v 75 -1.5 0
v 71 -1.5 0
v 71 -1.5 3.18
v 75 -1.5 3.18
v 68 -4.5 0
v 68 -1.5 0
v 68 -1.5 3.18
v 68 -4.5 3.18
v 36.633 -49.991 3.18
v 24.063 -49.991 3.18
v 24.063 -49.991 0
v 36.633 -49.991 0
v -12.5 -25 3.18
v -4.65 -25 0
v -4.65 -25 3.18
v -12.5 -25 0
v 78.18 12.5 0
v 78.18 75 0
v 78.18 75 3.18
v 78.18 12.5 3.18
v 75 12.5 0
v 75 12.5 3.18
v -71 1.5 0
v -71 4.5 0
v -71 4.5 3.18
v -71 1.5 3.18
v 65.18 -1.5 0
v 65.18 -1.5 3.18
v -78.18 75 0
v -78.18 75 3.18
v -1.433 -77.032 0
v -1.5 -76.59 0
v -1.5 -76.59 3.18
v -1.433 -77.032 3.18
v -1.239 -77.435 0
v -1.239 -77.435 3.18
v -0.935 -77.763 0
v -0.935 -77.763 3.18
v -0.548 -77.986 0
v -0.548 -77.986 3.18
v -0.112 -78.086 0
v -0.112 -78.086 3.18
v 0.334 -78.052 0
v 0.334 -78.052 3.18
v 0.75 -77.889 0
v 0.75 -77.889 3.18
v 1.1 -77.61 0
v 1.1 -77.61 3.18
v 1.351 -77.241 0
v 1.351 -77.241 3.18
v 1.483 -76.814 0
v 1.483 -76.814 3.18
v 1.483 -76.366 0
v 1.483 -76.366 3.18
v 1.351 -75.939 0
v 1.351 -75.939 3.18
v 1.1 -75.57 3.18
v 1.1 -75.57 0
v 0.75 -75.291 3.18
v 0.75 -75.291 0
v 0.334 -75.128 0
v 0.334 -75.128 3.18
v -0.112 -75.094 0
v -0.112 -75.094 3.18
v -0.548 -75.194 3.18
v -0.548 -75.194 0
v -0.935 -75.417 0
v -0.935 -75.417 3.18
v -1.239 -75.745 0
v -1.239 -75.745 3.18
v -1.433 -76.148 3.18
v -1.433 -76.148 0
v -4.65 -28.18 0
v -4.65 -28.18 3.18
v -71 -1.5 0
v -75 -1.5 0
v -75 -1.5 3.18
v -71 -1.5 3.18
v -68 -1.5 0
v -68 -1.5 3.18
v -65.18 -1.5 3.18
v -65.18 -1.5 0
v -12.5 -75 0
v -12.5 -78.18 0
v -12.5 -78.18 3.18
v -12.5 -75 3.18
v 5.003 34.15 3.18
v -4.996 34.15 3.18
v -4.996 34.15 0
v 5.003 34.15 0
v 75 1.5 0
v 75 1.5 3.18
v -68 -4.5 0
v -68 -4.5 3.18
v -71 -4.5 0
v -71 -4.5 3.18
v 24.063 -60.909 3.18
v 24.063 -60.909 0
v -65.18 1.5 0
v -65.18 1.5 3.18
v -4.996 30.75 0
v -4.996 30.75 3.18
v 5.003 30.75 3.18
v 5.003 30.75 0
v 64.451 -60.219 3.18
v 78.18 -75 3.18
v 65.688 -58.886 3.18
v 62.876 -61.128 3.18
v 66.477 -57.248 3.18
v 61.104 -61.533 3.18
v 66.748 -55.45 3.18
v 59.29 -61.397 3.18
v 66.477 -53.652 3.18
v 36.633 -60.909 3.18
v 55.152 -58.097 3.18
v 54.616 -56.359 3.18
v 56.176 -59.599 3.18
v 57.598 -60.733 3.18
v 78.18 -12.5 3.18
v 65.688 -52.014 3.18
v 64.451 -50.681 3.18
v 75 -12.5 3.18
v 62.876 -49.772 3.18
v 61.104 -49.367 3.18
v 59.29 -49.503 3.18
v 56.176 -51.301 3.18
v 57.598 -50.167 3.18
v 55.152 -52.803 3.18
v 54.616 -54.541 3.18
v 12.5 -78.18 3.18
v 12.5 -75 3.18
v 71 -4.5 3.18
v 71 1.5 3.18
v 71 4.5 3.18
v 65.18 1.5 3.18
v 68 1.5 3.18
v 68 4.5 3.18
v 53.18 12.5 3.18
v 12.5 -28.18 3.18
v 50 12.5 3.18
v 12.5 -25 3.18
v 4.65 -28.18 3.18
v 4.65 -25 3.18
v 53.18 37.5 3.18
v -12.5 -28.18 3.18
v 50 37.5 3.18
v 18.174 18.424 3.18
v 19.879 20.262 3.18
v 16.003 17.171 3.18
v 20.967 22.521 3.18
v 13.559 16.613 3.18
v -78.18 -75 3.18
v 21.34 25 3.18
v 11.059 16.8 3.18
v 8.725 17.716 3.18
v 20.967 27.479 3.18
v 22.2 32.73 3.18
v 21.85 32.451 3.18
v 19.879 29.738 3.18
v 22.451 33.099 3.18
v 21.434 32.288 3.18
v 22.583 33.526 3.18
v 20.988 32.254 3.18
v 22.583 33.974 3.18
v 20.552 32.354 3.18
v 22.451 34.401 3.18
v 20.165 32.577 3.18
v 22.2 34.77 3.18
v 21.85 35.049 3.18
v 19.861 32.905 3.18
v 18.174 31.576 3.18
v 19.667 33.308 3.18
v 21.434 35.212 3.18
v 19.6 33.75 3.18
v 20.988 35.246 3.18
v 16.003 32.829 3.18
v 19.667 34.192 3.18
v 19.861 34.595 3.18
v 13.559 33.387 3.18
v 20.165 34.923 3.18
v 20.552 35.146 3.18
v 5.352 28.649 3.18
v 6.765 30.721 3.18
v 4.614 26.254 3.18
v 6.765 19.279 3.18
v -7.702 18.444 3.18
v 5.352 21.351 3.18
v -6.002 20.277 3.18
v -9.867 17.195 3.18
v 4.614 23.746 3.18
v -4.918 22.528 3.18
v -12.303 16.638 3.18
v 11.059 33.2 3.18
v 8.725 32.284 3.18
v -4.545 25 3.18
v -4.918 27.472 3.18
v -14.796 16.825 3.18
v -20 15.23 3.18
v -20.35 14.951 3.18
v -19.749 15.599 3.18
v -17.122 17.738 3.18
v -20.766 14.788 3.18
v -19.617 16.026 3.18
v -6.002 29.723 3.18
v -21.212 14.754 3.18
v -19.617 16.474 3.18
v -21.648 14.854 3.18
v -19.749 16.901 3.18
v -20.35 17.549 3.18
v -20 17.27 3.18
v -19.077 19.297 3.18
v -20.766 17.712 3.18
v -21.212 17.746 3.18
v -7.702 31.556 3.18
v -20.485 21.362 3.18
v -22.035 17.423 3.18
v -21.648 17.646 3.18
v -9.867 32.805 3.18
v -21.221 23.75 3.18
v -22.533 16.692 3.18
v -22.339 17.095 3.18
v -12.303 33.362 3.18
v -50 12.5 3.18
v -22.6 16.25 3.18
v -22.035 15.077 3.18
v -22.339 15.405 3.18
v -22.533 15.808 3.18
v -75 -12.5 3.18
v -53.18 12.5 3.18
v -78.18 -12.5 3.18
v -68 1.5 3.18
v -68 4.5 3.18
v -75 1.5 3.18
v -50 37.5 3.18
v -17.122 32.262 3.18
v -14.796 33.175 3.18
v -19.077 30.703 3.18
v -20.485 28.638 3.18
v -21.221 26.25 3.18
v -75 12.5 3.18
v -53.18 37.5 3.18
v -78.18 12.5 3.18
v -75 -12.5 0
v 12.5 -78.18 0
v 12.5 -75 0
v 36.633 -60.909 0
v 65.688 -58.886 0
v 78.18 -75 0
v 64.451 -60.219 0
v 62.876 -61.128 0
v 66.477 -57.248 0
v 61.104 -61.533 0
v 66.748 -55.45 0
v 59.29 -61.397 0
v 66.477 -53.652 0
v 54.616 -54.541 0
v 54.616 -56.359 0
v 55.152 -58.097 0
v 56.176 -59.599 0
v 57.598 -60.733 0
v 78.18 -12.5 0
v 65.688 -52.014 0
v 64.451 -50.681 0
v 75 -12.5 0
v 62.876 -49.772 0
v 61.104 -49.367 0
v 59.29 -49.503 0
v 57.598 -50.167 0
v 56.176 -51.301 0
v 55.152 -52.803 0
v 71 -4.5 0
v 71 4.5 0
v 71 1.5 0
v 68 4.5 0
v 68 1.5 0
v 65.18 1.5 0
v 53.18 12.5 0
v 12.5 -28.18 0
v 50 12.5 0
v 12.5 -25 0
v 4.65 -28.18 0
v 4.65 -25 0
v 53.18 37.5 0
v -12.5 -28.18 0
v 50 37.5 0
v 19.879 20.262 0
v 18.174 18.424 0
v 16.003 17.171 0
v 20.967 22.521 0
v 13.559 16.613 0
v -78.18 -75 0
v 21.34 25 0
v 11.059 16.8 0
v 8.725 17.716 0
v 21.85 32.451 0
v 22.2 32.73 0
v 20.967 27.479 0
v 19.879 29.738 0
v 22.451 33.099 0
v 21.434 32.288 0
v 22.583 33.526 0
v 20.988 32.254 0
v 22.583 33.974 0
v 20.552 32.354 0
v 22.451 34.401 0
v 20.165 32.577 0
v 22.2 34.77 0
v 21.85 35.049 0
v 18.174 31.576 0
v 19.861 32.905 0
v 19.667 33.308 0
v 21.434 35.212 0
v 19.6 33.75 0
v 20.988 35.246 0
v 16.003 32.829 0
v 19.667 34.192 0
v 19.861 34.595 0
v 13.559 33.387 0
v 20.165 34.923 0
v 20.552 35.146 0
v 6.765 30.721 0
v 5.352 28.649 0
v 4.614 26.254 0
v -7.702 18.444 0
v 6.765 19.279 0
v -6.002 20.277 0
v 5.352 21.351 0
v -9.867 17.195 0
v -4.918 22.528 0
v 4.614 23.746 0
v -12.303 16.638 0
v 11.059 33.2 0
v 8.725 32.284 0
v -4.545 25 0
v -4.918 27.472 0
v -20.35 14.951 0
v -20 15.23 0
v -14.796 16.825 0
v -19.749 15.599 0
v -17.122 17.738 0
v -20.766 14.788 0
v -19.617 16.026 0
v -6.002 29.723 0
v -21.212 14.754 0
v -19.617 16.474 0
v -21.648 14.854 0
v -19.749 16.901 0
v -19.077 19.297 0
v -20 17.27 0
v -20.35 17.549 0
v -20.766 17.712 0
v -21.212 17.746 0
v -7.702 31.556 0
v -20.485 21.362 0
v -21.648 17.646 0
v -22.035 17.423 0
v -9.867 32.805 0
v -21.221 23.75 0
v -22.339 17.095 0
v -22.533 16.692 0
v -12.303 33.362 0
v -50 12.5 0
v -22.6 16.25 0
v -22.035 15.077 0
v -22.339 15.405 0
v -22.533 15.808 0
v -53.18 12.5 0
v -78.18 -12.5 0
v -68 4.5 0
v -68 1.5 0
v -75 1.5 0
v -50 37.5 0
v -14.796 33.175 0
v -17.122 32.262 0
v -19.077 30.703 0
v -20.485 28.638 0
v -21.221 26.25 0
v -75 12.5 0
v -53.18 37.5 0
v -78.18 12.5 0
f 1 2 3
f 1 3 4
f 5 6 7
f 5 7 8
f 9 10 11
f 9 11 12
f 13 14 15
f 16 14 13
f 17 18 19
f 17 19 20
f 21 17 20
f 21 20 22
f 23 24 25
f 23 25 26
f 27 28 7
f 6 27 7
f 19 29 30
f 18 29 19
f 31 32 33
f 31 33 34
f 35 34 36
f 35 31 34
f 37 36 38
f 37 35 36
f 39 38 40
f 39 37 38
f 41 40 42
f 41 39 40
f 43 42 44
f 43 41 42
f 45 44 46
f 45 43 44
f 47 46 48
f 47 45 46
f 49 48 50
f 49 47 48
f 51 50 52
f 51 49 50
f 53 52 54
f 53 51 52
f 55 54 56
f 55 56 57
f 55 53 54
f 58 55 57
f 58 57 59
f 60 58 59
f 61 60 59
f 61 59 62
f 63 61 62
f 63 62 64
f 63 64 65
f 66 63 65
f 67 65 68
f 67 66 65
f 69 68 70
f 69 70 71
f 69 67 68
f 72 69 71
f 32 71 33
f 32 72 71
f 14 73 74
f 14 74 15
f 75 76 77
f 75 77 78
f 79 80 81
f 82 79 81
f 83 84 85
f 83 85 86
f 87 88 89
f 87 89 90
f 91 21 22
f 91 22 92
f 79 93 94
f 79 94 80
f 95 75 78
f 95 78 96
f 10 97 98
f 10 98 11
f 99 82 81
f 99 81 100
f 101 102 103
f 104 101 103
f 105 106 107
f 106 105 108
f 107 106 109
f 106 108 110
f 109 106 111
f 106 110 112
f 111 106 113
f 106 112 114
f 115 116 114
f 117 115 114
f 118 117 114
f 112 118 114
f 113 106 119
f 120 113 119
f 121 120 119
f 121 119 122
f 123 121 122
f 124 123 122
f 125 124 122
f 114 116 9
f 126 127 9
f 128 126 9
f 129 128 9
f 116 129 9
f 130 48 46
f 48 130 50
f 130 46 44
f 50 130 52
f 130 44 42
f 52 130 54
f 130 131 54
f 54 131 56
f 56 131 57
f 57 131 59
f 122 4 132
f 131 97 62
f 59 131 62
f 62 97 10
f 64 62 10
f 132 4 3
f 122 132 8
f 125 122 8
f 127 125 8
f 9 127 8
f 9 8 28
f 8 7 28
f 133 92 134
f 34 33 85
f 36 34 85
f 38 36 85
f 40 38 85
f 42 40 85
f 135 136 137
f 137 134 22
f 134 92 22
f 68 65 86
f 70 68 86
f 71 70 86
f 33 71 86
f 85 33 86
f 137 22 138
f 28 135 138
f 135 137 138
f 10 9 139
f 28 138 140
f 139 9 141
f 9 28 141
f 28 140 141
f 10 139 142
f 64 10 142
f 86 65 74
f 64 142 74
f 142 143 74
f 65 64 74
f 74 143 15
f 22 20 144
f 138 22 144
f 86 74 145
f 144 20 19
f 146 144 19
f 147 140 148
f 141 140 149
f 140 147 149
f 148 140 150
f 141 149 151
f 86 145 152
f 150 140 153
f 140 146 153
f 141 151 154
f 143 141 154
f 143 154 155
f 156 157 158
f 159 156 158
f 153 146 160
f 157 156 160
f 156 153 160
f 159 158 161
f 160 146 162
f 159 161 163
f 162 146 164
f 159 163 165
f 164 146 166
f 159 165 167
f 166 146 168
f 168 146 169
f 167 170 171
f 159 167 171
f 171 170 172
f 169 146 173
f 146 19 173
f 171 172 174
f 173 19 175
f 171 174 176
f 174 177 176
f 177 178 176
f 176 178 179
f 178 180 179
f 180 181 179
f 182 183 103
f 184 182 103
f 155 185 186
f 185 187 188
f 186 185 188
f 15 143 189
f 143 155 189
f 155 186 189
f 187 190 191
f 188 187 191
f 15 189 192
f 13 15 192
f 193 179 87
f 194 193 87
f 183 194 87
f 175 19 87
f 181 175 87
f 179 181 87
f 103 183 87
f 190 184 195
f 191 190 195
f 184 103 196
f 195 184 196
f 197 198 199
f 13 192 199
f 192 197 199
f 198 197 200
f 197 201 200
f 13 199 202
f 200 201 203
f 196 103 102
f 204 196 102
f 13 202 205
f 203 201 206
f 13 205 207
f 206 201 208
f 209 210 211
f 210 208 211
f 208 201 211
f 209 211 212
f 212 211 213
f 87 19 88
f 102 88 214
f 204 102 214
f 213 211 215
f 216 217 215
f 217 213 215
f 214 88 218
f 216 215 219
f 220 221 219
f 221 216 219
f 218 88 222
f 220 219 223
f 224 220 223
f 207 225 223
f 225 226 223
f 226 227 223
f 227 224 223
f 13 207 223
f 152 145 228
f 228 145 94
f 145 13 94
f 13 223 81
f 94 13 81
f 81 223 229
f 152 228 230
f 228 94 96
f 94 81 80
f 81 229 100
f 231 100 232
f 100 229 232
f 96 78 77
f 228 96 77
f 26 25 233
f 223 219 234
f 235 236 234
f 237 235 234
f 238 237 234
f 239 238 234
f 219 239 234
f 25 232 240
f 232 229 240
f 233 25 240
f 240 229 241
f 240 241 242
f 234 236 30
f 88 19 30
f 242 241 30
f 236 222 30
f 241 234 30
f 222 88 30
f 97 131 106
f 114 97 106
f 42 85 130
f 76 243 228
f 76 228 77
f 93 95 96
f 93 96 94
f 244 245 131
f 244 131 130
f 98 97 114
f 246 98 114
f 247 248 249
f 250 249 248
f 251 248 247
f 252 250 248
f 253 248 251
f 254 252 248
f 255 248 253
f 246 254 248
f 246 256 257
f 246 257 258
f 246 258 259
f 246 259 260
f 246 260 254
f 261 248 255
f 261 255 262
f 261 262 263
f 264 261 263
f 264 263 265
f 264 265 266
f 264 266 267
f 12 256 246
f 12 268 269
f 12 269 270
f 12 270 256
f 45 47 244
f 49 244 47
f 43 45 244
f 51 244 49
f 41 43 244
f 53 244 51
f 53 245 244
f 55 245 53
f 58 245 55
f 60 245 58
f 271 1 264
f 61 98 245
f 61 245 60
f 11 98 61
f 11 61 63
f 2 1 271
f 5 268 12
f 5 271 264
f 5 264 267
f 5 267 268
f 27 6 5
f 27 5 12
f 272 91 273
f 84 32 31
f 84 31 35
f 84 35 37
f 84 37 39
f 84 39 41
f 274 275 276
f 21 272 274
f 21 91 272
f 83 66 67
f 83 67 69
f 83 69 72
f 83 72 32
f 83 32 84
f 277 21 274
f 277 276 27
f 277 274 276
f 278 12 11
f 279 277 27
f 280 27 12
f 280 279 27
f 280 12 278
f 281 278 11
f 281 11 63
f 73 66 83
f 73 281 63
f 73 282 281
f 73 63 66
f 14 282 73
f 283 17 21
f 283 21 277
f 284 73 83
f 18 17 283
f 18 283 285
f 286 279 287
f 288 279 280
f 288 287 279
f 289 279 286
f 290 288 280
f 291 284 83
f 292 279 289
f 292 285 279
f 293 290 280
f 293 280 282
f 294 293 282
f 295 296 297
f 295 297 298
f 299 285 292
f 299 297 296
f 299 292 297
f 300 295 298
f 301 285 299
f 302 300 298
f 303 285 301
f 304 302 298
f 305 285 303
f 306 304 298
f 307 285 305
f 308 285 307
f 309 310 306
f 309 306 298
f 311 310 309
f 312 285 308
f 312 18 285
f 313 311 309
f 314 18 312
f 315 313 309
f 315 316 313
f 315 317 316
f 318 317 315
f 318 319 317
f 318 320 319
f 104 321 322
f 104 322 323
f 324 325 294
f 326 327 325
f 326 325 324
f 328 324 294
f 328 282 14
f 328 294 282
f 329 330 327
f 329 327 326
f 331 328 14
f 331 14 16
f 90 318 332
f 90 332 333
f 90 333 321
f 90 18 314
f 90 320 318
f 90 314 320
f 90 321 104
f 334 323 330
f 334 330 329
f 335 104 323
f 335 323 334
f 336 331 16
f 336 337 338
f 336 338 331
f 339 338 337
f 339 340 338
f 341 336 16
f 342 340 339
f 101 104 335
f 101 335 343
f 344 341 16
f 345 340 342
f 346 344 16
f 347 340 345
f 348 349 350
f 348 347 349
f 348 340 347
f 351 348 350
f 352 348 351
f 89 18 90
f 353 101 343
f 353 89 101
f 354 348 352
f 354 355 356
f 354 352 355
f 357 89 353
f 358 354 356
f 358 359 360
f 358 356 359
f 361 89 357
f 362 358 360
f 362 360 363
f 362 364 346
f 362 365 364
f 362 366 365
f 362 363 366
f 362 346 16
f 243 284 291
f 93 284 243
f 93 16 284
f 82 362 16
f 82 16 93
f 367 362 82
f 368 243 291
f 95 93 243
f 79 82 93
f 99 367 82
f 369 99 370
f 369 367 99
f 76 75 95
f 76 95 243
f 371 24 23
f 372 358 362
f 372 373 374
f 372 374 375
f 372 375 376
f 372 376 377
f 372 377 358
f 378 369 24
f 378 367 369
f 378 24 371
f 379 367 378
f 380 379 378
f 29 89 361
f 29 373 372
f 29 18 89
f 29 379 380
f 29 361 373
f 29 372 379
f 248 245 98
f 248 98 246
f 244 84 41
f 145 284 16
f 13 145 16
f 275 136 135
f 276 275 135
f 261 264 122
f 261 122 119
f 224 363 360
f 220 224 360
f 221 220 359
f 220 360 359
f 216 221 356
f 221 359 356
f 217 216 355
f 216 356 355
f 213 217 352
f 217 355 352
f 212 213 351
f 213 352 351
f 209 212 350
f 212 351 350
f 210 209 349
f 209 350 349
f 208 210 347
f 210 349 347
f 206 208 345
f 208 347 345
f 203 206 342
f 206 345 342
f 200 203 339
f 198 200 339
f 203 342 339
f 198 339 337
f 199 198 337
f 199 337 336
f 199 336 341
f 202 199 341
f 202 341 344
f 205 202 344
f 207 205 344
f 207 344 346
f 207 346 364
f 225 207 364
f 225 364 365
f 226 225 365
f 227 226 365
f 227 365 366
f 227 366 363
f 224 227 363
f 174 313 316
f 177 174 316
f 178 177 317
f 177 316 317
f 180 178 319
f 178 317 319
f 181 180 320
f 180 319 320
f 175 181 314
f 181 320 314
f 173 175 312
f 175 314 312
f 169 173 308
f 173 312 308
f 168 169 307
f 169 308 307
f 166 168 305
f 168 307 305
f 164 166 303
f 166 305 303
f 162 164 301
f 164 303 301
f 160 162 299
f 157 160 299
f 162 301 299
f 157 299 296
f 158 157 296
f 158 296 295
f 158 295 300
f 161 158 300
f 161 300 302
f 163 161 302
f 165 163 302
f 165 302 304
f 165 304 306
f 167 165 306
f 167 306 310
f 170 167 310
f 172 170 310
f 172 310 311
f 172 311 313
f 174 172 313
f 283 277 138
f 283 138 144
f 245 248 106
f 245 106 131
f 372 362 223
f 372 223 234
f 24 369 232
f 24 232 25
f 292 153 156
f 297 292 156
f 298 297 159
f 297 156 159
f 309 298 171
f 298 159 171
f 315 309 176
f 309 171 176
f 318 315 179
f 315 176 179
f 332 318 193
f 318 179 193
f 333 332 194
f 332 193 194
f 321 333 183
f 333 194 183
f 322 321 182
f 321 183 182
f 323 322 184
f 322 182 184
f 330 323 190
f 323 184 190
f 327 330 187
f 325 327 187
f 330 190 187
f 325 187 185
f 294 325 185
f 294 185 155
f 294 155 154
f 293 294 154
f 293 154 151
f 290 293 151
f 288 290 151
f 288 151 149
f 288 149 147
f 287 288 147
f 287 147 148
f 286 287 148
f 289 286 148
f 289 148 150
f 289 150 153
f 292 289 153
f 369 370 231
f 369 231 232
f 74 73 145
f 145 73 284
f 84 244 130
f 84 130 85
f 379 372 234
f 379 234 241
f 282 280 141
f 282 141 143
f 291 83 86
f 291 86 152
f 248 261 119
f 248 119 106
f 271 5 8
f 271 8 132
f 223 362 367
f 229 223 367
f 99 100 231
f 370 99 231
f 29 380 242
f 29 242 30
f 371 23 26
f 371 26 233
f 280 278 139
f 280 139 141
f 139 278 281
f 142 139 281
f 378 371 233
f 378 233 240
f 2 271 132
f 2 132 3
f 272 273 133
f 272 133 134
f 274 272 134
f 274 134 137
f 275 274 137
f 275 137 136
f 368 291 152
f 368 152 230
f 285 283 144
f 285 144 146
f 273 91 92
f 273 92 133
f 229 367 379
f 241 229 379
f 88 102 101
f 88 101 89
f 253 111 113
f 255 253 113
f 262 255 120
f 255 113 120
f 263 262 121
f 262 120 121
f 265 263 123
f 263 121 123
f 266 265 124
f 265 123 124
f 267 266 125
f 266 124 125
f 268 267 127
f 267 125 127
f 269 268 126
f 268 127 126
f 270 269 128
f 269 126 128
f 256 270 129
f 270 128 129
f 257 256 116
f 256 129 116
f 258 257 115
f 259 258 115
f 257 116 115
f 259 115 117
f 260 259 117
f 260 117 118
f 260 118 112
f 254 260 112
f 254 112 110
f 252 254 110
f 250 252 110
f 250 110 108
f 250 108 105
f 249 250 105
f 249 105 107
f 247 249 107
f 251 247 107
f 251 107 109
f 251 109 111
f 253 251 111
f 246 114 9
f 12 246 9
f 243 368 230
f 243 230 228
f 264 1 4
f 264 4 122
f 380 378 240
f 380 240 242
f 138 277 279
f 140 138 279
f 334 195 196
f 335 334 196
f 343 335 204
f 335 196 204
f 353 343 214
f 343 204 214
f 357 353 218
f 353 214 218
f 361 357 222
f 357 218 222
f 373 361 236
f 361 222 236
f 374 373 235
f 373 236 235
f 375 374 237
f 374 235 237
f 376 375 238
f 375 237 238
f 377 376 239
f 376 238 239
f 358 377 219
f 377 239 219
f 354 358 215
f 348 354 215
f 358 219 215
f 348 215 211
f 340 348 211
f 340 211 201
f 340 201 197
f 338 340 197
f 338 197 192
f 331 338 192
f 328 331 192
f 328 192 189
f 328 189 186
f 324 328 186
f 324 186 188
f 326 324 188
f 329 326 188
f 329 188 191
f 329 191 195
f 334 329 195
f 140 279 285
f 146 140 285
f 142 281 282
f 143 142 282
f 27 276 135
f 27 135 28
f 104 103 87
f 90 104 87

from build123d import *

# Parameters (mm, degrees)
SKETCH1_R           = 1.5
BOSS_EXTRUDE1_DEPTH = 3.18
SKETCH2_R           = 6.1
SKETCH2_W           = 12.570473208
SKETCH2_H           = 10.91819785
CUT_EXTRUDE1_DEPTH  = 20
SKETCH4_R           = 8.384981778
SKETCH4_R_2         = 8.410411153
SKETCH4_W           = 9.999333355
SKETCH4_H           = 3.400001112
CUT_EXTRUDE2_DEPTH  = 10
SKETCH5_W           = 3.18
SKETCH5_H           = 25
SKETCH5_W_2         = 7.85
SKETCH5_H_2         = 3.18
CUT_EXTRUDE3_DEPTH  = 10
SKETCH8_R           = 1.5
CUT_EXTRUDE4_DEPTH  = 10


with BuildPart() as part:
    # Sketch1 → Boss-Extrude1 (new body)
    with BuildSketch(Plane.XY):
        Polygon((-78.18, 75), (78.18, 75), (78.18, 12.5), (75, 12.5), (75, 1.5), (71, 1.5), (71, 4.5), (68, 4.5), (68, 1.5), (65.18, 1.5), (65.18, -1.5), (68, -1.5), (68, -4.5), (71, -4.5), (71, -1.5), (75, -1.5), (75, -12.5), (78.18, -12.5), (78.18, -75), (12.5, -75), (12.5, -78.18), (-12.5, -78.18), (-12.5, -75), (-78.18, -75), (-78.18, -12.5), (-75, -12.5), (-75, -1.5), (-71, -1.5), (-71, -4.5), (-68, -4.5), (-68, -1.5), (-65.18, -1.5), (-65.18, 1.5), (-68, 1.5), (-68, 4.5), (-71, 4.5), (-71, 1.5), (-75, 1.5), (-75, 12.5), (-78.18, 12.5), align=None)
        with Locations(Location((0, -76.59, 0), (0, 0, 180))):
            Circle(SKETCH1_R, mode=Mode.SUBTRACT)
    extrude(amount=BOSS_EXTRUDE1_DEPTH)

    # Sketch2 → Cut-Extrude1 (cut)
    with BuildSketch(Plane.XY.offset(3.18)):
        with Locations((60.647779645, -55.45)):
            Circle(SKETCH2_R)
        with Locations((30.347779645, -55.45)):
            Rectangle(SKETCH2_W, SKETCH2_H)
    extrude(amount=-CUT_EXTRUDE1_DEPTH, mode=Mode.SUBTRACT)

    # Sketch4 → Cut-Extrude2 (cut)
    with BuildSketch(Plane.XY.offset(3.18)):
        with Locations((-12.93, 25)):
            Circle(SKETCH4_R)
        with Locations((12.93, 25)):
            Circle(SKETCH4_R_2)
        with Locations((0.003828225, 32.45)):
            Rectangle(SKETCH4_W, SKETCH4_H)
    extrude(amount=-CUT_EXTRUDE2_DEPTH, mode=Mode.SUBTRACT)

    # Sketch5 → Cut-Extrude3 (cut)
    with BuildSketch(Plane(origin=(0, 0, 0), x_dir=(-1, 0, 0), z_dir=(0, 0, -1))):
        with Locations((51.59, 25)):
            Rectangle(SKETCH5_W, SKETCH5_H)
        with Locations((-8.575, -26.59)):
            Rectangle(SKETCH5_W_2, SKETCH5_H_2)
        with Locations((8.575, -26.59)):
            Rectangle(SKETCH5_W_2, SKETCH5_H_2)
        with Locations((-51.59, 25)):
            Rectangle(SKETCH5_W, SKETCH5_H)
    extrude(amount=-CUT_EXTRUDE3_DEPTH, mode=Mode.SUBTRACT)

    # Sketch8 → Cut-Extrude4 (cut)
    with BuildSketch(Plane(origin=(0, 0, 0), x_dir=(-1, 0, 0), z_dir=(0, 0, -1))):
        with Locations((21.1, 16.25)):
            Circle(SKETCH8_R)
        with Locations((-21.1, 33.75)):
            Circle(SKETCH8_R)
    extrude(amount=-CUT_EXTRUDE4_DEPTH, mode=Mode.SUBTRACT)


solid = part.part
